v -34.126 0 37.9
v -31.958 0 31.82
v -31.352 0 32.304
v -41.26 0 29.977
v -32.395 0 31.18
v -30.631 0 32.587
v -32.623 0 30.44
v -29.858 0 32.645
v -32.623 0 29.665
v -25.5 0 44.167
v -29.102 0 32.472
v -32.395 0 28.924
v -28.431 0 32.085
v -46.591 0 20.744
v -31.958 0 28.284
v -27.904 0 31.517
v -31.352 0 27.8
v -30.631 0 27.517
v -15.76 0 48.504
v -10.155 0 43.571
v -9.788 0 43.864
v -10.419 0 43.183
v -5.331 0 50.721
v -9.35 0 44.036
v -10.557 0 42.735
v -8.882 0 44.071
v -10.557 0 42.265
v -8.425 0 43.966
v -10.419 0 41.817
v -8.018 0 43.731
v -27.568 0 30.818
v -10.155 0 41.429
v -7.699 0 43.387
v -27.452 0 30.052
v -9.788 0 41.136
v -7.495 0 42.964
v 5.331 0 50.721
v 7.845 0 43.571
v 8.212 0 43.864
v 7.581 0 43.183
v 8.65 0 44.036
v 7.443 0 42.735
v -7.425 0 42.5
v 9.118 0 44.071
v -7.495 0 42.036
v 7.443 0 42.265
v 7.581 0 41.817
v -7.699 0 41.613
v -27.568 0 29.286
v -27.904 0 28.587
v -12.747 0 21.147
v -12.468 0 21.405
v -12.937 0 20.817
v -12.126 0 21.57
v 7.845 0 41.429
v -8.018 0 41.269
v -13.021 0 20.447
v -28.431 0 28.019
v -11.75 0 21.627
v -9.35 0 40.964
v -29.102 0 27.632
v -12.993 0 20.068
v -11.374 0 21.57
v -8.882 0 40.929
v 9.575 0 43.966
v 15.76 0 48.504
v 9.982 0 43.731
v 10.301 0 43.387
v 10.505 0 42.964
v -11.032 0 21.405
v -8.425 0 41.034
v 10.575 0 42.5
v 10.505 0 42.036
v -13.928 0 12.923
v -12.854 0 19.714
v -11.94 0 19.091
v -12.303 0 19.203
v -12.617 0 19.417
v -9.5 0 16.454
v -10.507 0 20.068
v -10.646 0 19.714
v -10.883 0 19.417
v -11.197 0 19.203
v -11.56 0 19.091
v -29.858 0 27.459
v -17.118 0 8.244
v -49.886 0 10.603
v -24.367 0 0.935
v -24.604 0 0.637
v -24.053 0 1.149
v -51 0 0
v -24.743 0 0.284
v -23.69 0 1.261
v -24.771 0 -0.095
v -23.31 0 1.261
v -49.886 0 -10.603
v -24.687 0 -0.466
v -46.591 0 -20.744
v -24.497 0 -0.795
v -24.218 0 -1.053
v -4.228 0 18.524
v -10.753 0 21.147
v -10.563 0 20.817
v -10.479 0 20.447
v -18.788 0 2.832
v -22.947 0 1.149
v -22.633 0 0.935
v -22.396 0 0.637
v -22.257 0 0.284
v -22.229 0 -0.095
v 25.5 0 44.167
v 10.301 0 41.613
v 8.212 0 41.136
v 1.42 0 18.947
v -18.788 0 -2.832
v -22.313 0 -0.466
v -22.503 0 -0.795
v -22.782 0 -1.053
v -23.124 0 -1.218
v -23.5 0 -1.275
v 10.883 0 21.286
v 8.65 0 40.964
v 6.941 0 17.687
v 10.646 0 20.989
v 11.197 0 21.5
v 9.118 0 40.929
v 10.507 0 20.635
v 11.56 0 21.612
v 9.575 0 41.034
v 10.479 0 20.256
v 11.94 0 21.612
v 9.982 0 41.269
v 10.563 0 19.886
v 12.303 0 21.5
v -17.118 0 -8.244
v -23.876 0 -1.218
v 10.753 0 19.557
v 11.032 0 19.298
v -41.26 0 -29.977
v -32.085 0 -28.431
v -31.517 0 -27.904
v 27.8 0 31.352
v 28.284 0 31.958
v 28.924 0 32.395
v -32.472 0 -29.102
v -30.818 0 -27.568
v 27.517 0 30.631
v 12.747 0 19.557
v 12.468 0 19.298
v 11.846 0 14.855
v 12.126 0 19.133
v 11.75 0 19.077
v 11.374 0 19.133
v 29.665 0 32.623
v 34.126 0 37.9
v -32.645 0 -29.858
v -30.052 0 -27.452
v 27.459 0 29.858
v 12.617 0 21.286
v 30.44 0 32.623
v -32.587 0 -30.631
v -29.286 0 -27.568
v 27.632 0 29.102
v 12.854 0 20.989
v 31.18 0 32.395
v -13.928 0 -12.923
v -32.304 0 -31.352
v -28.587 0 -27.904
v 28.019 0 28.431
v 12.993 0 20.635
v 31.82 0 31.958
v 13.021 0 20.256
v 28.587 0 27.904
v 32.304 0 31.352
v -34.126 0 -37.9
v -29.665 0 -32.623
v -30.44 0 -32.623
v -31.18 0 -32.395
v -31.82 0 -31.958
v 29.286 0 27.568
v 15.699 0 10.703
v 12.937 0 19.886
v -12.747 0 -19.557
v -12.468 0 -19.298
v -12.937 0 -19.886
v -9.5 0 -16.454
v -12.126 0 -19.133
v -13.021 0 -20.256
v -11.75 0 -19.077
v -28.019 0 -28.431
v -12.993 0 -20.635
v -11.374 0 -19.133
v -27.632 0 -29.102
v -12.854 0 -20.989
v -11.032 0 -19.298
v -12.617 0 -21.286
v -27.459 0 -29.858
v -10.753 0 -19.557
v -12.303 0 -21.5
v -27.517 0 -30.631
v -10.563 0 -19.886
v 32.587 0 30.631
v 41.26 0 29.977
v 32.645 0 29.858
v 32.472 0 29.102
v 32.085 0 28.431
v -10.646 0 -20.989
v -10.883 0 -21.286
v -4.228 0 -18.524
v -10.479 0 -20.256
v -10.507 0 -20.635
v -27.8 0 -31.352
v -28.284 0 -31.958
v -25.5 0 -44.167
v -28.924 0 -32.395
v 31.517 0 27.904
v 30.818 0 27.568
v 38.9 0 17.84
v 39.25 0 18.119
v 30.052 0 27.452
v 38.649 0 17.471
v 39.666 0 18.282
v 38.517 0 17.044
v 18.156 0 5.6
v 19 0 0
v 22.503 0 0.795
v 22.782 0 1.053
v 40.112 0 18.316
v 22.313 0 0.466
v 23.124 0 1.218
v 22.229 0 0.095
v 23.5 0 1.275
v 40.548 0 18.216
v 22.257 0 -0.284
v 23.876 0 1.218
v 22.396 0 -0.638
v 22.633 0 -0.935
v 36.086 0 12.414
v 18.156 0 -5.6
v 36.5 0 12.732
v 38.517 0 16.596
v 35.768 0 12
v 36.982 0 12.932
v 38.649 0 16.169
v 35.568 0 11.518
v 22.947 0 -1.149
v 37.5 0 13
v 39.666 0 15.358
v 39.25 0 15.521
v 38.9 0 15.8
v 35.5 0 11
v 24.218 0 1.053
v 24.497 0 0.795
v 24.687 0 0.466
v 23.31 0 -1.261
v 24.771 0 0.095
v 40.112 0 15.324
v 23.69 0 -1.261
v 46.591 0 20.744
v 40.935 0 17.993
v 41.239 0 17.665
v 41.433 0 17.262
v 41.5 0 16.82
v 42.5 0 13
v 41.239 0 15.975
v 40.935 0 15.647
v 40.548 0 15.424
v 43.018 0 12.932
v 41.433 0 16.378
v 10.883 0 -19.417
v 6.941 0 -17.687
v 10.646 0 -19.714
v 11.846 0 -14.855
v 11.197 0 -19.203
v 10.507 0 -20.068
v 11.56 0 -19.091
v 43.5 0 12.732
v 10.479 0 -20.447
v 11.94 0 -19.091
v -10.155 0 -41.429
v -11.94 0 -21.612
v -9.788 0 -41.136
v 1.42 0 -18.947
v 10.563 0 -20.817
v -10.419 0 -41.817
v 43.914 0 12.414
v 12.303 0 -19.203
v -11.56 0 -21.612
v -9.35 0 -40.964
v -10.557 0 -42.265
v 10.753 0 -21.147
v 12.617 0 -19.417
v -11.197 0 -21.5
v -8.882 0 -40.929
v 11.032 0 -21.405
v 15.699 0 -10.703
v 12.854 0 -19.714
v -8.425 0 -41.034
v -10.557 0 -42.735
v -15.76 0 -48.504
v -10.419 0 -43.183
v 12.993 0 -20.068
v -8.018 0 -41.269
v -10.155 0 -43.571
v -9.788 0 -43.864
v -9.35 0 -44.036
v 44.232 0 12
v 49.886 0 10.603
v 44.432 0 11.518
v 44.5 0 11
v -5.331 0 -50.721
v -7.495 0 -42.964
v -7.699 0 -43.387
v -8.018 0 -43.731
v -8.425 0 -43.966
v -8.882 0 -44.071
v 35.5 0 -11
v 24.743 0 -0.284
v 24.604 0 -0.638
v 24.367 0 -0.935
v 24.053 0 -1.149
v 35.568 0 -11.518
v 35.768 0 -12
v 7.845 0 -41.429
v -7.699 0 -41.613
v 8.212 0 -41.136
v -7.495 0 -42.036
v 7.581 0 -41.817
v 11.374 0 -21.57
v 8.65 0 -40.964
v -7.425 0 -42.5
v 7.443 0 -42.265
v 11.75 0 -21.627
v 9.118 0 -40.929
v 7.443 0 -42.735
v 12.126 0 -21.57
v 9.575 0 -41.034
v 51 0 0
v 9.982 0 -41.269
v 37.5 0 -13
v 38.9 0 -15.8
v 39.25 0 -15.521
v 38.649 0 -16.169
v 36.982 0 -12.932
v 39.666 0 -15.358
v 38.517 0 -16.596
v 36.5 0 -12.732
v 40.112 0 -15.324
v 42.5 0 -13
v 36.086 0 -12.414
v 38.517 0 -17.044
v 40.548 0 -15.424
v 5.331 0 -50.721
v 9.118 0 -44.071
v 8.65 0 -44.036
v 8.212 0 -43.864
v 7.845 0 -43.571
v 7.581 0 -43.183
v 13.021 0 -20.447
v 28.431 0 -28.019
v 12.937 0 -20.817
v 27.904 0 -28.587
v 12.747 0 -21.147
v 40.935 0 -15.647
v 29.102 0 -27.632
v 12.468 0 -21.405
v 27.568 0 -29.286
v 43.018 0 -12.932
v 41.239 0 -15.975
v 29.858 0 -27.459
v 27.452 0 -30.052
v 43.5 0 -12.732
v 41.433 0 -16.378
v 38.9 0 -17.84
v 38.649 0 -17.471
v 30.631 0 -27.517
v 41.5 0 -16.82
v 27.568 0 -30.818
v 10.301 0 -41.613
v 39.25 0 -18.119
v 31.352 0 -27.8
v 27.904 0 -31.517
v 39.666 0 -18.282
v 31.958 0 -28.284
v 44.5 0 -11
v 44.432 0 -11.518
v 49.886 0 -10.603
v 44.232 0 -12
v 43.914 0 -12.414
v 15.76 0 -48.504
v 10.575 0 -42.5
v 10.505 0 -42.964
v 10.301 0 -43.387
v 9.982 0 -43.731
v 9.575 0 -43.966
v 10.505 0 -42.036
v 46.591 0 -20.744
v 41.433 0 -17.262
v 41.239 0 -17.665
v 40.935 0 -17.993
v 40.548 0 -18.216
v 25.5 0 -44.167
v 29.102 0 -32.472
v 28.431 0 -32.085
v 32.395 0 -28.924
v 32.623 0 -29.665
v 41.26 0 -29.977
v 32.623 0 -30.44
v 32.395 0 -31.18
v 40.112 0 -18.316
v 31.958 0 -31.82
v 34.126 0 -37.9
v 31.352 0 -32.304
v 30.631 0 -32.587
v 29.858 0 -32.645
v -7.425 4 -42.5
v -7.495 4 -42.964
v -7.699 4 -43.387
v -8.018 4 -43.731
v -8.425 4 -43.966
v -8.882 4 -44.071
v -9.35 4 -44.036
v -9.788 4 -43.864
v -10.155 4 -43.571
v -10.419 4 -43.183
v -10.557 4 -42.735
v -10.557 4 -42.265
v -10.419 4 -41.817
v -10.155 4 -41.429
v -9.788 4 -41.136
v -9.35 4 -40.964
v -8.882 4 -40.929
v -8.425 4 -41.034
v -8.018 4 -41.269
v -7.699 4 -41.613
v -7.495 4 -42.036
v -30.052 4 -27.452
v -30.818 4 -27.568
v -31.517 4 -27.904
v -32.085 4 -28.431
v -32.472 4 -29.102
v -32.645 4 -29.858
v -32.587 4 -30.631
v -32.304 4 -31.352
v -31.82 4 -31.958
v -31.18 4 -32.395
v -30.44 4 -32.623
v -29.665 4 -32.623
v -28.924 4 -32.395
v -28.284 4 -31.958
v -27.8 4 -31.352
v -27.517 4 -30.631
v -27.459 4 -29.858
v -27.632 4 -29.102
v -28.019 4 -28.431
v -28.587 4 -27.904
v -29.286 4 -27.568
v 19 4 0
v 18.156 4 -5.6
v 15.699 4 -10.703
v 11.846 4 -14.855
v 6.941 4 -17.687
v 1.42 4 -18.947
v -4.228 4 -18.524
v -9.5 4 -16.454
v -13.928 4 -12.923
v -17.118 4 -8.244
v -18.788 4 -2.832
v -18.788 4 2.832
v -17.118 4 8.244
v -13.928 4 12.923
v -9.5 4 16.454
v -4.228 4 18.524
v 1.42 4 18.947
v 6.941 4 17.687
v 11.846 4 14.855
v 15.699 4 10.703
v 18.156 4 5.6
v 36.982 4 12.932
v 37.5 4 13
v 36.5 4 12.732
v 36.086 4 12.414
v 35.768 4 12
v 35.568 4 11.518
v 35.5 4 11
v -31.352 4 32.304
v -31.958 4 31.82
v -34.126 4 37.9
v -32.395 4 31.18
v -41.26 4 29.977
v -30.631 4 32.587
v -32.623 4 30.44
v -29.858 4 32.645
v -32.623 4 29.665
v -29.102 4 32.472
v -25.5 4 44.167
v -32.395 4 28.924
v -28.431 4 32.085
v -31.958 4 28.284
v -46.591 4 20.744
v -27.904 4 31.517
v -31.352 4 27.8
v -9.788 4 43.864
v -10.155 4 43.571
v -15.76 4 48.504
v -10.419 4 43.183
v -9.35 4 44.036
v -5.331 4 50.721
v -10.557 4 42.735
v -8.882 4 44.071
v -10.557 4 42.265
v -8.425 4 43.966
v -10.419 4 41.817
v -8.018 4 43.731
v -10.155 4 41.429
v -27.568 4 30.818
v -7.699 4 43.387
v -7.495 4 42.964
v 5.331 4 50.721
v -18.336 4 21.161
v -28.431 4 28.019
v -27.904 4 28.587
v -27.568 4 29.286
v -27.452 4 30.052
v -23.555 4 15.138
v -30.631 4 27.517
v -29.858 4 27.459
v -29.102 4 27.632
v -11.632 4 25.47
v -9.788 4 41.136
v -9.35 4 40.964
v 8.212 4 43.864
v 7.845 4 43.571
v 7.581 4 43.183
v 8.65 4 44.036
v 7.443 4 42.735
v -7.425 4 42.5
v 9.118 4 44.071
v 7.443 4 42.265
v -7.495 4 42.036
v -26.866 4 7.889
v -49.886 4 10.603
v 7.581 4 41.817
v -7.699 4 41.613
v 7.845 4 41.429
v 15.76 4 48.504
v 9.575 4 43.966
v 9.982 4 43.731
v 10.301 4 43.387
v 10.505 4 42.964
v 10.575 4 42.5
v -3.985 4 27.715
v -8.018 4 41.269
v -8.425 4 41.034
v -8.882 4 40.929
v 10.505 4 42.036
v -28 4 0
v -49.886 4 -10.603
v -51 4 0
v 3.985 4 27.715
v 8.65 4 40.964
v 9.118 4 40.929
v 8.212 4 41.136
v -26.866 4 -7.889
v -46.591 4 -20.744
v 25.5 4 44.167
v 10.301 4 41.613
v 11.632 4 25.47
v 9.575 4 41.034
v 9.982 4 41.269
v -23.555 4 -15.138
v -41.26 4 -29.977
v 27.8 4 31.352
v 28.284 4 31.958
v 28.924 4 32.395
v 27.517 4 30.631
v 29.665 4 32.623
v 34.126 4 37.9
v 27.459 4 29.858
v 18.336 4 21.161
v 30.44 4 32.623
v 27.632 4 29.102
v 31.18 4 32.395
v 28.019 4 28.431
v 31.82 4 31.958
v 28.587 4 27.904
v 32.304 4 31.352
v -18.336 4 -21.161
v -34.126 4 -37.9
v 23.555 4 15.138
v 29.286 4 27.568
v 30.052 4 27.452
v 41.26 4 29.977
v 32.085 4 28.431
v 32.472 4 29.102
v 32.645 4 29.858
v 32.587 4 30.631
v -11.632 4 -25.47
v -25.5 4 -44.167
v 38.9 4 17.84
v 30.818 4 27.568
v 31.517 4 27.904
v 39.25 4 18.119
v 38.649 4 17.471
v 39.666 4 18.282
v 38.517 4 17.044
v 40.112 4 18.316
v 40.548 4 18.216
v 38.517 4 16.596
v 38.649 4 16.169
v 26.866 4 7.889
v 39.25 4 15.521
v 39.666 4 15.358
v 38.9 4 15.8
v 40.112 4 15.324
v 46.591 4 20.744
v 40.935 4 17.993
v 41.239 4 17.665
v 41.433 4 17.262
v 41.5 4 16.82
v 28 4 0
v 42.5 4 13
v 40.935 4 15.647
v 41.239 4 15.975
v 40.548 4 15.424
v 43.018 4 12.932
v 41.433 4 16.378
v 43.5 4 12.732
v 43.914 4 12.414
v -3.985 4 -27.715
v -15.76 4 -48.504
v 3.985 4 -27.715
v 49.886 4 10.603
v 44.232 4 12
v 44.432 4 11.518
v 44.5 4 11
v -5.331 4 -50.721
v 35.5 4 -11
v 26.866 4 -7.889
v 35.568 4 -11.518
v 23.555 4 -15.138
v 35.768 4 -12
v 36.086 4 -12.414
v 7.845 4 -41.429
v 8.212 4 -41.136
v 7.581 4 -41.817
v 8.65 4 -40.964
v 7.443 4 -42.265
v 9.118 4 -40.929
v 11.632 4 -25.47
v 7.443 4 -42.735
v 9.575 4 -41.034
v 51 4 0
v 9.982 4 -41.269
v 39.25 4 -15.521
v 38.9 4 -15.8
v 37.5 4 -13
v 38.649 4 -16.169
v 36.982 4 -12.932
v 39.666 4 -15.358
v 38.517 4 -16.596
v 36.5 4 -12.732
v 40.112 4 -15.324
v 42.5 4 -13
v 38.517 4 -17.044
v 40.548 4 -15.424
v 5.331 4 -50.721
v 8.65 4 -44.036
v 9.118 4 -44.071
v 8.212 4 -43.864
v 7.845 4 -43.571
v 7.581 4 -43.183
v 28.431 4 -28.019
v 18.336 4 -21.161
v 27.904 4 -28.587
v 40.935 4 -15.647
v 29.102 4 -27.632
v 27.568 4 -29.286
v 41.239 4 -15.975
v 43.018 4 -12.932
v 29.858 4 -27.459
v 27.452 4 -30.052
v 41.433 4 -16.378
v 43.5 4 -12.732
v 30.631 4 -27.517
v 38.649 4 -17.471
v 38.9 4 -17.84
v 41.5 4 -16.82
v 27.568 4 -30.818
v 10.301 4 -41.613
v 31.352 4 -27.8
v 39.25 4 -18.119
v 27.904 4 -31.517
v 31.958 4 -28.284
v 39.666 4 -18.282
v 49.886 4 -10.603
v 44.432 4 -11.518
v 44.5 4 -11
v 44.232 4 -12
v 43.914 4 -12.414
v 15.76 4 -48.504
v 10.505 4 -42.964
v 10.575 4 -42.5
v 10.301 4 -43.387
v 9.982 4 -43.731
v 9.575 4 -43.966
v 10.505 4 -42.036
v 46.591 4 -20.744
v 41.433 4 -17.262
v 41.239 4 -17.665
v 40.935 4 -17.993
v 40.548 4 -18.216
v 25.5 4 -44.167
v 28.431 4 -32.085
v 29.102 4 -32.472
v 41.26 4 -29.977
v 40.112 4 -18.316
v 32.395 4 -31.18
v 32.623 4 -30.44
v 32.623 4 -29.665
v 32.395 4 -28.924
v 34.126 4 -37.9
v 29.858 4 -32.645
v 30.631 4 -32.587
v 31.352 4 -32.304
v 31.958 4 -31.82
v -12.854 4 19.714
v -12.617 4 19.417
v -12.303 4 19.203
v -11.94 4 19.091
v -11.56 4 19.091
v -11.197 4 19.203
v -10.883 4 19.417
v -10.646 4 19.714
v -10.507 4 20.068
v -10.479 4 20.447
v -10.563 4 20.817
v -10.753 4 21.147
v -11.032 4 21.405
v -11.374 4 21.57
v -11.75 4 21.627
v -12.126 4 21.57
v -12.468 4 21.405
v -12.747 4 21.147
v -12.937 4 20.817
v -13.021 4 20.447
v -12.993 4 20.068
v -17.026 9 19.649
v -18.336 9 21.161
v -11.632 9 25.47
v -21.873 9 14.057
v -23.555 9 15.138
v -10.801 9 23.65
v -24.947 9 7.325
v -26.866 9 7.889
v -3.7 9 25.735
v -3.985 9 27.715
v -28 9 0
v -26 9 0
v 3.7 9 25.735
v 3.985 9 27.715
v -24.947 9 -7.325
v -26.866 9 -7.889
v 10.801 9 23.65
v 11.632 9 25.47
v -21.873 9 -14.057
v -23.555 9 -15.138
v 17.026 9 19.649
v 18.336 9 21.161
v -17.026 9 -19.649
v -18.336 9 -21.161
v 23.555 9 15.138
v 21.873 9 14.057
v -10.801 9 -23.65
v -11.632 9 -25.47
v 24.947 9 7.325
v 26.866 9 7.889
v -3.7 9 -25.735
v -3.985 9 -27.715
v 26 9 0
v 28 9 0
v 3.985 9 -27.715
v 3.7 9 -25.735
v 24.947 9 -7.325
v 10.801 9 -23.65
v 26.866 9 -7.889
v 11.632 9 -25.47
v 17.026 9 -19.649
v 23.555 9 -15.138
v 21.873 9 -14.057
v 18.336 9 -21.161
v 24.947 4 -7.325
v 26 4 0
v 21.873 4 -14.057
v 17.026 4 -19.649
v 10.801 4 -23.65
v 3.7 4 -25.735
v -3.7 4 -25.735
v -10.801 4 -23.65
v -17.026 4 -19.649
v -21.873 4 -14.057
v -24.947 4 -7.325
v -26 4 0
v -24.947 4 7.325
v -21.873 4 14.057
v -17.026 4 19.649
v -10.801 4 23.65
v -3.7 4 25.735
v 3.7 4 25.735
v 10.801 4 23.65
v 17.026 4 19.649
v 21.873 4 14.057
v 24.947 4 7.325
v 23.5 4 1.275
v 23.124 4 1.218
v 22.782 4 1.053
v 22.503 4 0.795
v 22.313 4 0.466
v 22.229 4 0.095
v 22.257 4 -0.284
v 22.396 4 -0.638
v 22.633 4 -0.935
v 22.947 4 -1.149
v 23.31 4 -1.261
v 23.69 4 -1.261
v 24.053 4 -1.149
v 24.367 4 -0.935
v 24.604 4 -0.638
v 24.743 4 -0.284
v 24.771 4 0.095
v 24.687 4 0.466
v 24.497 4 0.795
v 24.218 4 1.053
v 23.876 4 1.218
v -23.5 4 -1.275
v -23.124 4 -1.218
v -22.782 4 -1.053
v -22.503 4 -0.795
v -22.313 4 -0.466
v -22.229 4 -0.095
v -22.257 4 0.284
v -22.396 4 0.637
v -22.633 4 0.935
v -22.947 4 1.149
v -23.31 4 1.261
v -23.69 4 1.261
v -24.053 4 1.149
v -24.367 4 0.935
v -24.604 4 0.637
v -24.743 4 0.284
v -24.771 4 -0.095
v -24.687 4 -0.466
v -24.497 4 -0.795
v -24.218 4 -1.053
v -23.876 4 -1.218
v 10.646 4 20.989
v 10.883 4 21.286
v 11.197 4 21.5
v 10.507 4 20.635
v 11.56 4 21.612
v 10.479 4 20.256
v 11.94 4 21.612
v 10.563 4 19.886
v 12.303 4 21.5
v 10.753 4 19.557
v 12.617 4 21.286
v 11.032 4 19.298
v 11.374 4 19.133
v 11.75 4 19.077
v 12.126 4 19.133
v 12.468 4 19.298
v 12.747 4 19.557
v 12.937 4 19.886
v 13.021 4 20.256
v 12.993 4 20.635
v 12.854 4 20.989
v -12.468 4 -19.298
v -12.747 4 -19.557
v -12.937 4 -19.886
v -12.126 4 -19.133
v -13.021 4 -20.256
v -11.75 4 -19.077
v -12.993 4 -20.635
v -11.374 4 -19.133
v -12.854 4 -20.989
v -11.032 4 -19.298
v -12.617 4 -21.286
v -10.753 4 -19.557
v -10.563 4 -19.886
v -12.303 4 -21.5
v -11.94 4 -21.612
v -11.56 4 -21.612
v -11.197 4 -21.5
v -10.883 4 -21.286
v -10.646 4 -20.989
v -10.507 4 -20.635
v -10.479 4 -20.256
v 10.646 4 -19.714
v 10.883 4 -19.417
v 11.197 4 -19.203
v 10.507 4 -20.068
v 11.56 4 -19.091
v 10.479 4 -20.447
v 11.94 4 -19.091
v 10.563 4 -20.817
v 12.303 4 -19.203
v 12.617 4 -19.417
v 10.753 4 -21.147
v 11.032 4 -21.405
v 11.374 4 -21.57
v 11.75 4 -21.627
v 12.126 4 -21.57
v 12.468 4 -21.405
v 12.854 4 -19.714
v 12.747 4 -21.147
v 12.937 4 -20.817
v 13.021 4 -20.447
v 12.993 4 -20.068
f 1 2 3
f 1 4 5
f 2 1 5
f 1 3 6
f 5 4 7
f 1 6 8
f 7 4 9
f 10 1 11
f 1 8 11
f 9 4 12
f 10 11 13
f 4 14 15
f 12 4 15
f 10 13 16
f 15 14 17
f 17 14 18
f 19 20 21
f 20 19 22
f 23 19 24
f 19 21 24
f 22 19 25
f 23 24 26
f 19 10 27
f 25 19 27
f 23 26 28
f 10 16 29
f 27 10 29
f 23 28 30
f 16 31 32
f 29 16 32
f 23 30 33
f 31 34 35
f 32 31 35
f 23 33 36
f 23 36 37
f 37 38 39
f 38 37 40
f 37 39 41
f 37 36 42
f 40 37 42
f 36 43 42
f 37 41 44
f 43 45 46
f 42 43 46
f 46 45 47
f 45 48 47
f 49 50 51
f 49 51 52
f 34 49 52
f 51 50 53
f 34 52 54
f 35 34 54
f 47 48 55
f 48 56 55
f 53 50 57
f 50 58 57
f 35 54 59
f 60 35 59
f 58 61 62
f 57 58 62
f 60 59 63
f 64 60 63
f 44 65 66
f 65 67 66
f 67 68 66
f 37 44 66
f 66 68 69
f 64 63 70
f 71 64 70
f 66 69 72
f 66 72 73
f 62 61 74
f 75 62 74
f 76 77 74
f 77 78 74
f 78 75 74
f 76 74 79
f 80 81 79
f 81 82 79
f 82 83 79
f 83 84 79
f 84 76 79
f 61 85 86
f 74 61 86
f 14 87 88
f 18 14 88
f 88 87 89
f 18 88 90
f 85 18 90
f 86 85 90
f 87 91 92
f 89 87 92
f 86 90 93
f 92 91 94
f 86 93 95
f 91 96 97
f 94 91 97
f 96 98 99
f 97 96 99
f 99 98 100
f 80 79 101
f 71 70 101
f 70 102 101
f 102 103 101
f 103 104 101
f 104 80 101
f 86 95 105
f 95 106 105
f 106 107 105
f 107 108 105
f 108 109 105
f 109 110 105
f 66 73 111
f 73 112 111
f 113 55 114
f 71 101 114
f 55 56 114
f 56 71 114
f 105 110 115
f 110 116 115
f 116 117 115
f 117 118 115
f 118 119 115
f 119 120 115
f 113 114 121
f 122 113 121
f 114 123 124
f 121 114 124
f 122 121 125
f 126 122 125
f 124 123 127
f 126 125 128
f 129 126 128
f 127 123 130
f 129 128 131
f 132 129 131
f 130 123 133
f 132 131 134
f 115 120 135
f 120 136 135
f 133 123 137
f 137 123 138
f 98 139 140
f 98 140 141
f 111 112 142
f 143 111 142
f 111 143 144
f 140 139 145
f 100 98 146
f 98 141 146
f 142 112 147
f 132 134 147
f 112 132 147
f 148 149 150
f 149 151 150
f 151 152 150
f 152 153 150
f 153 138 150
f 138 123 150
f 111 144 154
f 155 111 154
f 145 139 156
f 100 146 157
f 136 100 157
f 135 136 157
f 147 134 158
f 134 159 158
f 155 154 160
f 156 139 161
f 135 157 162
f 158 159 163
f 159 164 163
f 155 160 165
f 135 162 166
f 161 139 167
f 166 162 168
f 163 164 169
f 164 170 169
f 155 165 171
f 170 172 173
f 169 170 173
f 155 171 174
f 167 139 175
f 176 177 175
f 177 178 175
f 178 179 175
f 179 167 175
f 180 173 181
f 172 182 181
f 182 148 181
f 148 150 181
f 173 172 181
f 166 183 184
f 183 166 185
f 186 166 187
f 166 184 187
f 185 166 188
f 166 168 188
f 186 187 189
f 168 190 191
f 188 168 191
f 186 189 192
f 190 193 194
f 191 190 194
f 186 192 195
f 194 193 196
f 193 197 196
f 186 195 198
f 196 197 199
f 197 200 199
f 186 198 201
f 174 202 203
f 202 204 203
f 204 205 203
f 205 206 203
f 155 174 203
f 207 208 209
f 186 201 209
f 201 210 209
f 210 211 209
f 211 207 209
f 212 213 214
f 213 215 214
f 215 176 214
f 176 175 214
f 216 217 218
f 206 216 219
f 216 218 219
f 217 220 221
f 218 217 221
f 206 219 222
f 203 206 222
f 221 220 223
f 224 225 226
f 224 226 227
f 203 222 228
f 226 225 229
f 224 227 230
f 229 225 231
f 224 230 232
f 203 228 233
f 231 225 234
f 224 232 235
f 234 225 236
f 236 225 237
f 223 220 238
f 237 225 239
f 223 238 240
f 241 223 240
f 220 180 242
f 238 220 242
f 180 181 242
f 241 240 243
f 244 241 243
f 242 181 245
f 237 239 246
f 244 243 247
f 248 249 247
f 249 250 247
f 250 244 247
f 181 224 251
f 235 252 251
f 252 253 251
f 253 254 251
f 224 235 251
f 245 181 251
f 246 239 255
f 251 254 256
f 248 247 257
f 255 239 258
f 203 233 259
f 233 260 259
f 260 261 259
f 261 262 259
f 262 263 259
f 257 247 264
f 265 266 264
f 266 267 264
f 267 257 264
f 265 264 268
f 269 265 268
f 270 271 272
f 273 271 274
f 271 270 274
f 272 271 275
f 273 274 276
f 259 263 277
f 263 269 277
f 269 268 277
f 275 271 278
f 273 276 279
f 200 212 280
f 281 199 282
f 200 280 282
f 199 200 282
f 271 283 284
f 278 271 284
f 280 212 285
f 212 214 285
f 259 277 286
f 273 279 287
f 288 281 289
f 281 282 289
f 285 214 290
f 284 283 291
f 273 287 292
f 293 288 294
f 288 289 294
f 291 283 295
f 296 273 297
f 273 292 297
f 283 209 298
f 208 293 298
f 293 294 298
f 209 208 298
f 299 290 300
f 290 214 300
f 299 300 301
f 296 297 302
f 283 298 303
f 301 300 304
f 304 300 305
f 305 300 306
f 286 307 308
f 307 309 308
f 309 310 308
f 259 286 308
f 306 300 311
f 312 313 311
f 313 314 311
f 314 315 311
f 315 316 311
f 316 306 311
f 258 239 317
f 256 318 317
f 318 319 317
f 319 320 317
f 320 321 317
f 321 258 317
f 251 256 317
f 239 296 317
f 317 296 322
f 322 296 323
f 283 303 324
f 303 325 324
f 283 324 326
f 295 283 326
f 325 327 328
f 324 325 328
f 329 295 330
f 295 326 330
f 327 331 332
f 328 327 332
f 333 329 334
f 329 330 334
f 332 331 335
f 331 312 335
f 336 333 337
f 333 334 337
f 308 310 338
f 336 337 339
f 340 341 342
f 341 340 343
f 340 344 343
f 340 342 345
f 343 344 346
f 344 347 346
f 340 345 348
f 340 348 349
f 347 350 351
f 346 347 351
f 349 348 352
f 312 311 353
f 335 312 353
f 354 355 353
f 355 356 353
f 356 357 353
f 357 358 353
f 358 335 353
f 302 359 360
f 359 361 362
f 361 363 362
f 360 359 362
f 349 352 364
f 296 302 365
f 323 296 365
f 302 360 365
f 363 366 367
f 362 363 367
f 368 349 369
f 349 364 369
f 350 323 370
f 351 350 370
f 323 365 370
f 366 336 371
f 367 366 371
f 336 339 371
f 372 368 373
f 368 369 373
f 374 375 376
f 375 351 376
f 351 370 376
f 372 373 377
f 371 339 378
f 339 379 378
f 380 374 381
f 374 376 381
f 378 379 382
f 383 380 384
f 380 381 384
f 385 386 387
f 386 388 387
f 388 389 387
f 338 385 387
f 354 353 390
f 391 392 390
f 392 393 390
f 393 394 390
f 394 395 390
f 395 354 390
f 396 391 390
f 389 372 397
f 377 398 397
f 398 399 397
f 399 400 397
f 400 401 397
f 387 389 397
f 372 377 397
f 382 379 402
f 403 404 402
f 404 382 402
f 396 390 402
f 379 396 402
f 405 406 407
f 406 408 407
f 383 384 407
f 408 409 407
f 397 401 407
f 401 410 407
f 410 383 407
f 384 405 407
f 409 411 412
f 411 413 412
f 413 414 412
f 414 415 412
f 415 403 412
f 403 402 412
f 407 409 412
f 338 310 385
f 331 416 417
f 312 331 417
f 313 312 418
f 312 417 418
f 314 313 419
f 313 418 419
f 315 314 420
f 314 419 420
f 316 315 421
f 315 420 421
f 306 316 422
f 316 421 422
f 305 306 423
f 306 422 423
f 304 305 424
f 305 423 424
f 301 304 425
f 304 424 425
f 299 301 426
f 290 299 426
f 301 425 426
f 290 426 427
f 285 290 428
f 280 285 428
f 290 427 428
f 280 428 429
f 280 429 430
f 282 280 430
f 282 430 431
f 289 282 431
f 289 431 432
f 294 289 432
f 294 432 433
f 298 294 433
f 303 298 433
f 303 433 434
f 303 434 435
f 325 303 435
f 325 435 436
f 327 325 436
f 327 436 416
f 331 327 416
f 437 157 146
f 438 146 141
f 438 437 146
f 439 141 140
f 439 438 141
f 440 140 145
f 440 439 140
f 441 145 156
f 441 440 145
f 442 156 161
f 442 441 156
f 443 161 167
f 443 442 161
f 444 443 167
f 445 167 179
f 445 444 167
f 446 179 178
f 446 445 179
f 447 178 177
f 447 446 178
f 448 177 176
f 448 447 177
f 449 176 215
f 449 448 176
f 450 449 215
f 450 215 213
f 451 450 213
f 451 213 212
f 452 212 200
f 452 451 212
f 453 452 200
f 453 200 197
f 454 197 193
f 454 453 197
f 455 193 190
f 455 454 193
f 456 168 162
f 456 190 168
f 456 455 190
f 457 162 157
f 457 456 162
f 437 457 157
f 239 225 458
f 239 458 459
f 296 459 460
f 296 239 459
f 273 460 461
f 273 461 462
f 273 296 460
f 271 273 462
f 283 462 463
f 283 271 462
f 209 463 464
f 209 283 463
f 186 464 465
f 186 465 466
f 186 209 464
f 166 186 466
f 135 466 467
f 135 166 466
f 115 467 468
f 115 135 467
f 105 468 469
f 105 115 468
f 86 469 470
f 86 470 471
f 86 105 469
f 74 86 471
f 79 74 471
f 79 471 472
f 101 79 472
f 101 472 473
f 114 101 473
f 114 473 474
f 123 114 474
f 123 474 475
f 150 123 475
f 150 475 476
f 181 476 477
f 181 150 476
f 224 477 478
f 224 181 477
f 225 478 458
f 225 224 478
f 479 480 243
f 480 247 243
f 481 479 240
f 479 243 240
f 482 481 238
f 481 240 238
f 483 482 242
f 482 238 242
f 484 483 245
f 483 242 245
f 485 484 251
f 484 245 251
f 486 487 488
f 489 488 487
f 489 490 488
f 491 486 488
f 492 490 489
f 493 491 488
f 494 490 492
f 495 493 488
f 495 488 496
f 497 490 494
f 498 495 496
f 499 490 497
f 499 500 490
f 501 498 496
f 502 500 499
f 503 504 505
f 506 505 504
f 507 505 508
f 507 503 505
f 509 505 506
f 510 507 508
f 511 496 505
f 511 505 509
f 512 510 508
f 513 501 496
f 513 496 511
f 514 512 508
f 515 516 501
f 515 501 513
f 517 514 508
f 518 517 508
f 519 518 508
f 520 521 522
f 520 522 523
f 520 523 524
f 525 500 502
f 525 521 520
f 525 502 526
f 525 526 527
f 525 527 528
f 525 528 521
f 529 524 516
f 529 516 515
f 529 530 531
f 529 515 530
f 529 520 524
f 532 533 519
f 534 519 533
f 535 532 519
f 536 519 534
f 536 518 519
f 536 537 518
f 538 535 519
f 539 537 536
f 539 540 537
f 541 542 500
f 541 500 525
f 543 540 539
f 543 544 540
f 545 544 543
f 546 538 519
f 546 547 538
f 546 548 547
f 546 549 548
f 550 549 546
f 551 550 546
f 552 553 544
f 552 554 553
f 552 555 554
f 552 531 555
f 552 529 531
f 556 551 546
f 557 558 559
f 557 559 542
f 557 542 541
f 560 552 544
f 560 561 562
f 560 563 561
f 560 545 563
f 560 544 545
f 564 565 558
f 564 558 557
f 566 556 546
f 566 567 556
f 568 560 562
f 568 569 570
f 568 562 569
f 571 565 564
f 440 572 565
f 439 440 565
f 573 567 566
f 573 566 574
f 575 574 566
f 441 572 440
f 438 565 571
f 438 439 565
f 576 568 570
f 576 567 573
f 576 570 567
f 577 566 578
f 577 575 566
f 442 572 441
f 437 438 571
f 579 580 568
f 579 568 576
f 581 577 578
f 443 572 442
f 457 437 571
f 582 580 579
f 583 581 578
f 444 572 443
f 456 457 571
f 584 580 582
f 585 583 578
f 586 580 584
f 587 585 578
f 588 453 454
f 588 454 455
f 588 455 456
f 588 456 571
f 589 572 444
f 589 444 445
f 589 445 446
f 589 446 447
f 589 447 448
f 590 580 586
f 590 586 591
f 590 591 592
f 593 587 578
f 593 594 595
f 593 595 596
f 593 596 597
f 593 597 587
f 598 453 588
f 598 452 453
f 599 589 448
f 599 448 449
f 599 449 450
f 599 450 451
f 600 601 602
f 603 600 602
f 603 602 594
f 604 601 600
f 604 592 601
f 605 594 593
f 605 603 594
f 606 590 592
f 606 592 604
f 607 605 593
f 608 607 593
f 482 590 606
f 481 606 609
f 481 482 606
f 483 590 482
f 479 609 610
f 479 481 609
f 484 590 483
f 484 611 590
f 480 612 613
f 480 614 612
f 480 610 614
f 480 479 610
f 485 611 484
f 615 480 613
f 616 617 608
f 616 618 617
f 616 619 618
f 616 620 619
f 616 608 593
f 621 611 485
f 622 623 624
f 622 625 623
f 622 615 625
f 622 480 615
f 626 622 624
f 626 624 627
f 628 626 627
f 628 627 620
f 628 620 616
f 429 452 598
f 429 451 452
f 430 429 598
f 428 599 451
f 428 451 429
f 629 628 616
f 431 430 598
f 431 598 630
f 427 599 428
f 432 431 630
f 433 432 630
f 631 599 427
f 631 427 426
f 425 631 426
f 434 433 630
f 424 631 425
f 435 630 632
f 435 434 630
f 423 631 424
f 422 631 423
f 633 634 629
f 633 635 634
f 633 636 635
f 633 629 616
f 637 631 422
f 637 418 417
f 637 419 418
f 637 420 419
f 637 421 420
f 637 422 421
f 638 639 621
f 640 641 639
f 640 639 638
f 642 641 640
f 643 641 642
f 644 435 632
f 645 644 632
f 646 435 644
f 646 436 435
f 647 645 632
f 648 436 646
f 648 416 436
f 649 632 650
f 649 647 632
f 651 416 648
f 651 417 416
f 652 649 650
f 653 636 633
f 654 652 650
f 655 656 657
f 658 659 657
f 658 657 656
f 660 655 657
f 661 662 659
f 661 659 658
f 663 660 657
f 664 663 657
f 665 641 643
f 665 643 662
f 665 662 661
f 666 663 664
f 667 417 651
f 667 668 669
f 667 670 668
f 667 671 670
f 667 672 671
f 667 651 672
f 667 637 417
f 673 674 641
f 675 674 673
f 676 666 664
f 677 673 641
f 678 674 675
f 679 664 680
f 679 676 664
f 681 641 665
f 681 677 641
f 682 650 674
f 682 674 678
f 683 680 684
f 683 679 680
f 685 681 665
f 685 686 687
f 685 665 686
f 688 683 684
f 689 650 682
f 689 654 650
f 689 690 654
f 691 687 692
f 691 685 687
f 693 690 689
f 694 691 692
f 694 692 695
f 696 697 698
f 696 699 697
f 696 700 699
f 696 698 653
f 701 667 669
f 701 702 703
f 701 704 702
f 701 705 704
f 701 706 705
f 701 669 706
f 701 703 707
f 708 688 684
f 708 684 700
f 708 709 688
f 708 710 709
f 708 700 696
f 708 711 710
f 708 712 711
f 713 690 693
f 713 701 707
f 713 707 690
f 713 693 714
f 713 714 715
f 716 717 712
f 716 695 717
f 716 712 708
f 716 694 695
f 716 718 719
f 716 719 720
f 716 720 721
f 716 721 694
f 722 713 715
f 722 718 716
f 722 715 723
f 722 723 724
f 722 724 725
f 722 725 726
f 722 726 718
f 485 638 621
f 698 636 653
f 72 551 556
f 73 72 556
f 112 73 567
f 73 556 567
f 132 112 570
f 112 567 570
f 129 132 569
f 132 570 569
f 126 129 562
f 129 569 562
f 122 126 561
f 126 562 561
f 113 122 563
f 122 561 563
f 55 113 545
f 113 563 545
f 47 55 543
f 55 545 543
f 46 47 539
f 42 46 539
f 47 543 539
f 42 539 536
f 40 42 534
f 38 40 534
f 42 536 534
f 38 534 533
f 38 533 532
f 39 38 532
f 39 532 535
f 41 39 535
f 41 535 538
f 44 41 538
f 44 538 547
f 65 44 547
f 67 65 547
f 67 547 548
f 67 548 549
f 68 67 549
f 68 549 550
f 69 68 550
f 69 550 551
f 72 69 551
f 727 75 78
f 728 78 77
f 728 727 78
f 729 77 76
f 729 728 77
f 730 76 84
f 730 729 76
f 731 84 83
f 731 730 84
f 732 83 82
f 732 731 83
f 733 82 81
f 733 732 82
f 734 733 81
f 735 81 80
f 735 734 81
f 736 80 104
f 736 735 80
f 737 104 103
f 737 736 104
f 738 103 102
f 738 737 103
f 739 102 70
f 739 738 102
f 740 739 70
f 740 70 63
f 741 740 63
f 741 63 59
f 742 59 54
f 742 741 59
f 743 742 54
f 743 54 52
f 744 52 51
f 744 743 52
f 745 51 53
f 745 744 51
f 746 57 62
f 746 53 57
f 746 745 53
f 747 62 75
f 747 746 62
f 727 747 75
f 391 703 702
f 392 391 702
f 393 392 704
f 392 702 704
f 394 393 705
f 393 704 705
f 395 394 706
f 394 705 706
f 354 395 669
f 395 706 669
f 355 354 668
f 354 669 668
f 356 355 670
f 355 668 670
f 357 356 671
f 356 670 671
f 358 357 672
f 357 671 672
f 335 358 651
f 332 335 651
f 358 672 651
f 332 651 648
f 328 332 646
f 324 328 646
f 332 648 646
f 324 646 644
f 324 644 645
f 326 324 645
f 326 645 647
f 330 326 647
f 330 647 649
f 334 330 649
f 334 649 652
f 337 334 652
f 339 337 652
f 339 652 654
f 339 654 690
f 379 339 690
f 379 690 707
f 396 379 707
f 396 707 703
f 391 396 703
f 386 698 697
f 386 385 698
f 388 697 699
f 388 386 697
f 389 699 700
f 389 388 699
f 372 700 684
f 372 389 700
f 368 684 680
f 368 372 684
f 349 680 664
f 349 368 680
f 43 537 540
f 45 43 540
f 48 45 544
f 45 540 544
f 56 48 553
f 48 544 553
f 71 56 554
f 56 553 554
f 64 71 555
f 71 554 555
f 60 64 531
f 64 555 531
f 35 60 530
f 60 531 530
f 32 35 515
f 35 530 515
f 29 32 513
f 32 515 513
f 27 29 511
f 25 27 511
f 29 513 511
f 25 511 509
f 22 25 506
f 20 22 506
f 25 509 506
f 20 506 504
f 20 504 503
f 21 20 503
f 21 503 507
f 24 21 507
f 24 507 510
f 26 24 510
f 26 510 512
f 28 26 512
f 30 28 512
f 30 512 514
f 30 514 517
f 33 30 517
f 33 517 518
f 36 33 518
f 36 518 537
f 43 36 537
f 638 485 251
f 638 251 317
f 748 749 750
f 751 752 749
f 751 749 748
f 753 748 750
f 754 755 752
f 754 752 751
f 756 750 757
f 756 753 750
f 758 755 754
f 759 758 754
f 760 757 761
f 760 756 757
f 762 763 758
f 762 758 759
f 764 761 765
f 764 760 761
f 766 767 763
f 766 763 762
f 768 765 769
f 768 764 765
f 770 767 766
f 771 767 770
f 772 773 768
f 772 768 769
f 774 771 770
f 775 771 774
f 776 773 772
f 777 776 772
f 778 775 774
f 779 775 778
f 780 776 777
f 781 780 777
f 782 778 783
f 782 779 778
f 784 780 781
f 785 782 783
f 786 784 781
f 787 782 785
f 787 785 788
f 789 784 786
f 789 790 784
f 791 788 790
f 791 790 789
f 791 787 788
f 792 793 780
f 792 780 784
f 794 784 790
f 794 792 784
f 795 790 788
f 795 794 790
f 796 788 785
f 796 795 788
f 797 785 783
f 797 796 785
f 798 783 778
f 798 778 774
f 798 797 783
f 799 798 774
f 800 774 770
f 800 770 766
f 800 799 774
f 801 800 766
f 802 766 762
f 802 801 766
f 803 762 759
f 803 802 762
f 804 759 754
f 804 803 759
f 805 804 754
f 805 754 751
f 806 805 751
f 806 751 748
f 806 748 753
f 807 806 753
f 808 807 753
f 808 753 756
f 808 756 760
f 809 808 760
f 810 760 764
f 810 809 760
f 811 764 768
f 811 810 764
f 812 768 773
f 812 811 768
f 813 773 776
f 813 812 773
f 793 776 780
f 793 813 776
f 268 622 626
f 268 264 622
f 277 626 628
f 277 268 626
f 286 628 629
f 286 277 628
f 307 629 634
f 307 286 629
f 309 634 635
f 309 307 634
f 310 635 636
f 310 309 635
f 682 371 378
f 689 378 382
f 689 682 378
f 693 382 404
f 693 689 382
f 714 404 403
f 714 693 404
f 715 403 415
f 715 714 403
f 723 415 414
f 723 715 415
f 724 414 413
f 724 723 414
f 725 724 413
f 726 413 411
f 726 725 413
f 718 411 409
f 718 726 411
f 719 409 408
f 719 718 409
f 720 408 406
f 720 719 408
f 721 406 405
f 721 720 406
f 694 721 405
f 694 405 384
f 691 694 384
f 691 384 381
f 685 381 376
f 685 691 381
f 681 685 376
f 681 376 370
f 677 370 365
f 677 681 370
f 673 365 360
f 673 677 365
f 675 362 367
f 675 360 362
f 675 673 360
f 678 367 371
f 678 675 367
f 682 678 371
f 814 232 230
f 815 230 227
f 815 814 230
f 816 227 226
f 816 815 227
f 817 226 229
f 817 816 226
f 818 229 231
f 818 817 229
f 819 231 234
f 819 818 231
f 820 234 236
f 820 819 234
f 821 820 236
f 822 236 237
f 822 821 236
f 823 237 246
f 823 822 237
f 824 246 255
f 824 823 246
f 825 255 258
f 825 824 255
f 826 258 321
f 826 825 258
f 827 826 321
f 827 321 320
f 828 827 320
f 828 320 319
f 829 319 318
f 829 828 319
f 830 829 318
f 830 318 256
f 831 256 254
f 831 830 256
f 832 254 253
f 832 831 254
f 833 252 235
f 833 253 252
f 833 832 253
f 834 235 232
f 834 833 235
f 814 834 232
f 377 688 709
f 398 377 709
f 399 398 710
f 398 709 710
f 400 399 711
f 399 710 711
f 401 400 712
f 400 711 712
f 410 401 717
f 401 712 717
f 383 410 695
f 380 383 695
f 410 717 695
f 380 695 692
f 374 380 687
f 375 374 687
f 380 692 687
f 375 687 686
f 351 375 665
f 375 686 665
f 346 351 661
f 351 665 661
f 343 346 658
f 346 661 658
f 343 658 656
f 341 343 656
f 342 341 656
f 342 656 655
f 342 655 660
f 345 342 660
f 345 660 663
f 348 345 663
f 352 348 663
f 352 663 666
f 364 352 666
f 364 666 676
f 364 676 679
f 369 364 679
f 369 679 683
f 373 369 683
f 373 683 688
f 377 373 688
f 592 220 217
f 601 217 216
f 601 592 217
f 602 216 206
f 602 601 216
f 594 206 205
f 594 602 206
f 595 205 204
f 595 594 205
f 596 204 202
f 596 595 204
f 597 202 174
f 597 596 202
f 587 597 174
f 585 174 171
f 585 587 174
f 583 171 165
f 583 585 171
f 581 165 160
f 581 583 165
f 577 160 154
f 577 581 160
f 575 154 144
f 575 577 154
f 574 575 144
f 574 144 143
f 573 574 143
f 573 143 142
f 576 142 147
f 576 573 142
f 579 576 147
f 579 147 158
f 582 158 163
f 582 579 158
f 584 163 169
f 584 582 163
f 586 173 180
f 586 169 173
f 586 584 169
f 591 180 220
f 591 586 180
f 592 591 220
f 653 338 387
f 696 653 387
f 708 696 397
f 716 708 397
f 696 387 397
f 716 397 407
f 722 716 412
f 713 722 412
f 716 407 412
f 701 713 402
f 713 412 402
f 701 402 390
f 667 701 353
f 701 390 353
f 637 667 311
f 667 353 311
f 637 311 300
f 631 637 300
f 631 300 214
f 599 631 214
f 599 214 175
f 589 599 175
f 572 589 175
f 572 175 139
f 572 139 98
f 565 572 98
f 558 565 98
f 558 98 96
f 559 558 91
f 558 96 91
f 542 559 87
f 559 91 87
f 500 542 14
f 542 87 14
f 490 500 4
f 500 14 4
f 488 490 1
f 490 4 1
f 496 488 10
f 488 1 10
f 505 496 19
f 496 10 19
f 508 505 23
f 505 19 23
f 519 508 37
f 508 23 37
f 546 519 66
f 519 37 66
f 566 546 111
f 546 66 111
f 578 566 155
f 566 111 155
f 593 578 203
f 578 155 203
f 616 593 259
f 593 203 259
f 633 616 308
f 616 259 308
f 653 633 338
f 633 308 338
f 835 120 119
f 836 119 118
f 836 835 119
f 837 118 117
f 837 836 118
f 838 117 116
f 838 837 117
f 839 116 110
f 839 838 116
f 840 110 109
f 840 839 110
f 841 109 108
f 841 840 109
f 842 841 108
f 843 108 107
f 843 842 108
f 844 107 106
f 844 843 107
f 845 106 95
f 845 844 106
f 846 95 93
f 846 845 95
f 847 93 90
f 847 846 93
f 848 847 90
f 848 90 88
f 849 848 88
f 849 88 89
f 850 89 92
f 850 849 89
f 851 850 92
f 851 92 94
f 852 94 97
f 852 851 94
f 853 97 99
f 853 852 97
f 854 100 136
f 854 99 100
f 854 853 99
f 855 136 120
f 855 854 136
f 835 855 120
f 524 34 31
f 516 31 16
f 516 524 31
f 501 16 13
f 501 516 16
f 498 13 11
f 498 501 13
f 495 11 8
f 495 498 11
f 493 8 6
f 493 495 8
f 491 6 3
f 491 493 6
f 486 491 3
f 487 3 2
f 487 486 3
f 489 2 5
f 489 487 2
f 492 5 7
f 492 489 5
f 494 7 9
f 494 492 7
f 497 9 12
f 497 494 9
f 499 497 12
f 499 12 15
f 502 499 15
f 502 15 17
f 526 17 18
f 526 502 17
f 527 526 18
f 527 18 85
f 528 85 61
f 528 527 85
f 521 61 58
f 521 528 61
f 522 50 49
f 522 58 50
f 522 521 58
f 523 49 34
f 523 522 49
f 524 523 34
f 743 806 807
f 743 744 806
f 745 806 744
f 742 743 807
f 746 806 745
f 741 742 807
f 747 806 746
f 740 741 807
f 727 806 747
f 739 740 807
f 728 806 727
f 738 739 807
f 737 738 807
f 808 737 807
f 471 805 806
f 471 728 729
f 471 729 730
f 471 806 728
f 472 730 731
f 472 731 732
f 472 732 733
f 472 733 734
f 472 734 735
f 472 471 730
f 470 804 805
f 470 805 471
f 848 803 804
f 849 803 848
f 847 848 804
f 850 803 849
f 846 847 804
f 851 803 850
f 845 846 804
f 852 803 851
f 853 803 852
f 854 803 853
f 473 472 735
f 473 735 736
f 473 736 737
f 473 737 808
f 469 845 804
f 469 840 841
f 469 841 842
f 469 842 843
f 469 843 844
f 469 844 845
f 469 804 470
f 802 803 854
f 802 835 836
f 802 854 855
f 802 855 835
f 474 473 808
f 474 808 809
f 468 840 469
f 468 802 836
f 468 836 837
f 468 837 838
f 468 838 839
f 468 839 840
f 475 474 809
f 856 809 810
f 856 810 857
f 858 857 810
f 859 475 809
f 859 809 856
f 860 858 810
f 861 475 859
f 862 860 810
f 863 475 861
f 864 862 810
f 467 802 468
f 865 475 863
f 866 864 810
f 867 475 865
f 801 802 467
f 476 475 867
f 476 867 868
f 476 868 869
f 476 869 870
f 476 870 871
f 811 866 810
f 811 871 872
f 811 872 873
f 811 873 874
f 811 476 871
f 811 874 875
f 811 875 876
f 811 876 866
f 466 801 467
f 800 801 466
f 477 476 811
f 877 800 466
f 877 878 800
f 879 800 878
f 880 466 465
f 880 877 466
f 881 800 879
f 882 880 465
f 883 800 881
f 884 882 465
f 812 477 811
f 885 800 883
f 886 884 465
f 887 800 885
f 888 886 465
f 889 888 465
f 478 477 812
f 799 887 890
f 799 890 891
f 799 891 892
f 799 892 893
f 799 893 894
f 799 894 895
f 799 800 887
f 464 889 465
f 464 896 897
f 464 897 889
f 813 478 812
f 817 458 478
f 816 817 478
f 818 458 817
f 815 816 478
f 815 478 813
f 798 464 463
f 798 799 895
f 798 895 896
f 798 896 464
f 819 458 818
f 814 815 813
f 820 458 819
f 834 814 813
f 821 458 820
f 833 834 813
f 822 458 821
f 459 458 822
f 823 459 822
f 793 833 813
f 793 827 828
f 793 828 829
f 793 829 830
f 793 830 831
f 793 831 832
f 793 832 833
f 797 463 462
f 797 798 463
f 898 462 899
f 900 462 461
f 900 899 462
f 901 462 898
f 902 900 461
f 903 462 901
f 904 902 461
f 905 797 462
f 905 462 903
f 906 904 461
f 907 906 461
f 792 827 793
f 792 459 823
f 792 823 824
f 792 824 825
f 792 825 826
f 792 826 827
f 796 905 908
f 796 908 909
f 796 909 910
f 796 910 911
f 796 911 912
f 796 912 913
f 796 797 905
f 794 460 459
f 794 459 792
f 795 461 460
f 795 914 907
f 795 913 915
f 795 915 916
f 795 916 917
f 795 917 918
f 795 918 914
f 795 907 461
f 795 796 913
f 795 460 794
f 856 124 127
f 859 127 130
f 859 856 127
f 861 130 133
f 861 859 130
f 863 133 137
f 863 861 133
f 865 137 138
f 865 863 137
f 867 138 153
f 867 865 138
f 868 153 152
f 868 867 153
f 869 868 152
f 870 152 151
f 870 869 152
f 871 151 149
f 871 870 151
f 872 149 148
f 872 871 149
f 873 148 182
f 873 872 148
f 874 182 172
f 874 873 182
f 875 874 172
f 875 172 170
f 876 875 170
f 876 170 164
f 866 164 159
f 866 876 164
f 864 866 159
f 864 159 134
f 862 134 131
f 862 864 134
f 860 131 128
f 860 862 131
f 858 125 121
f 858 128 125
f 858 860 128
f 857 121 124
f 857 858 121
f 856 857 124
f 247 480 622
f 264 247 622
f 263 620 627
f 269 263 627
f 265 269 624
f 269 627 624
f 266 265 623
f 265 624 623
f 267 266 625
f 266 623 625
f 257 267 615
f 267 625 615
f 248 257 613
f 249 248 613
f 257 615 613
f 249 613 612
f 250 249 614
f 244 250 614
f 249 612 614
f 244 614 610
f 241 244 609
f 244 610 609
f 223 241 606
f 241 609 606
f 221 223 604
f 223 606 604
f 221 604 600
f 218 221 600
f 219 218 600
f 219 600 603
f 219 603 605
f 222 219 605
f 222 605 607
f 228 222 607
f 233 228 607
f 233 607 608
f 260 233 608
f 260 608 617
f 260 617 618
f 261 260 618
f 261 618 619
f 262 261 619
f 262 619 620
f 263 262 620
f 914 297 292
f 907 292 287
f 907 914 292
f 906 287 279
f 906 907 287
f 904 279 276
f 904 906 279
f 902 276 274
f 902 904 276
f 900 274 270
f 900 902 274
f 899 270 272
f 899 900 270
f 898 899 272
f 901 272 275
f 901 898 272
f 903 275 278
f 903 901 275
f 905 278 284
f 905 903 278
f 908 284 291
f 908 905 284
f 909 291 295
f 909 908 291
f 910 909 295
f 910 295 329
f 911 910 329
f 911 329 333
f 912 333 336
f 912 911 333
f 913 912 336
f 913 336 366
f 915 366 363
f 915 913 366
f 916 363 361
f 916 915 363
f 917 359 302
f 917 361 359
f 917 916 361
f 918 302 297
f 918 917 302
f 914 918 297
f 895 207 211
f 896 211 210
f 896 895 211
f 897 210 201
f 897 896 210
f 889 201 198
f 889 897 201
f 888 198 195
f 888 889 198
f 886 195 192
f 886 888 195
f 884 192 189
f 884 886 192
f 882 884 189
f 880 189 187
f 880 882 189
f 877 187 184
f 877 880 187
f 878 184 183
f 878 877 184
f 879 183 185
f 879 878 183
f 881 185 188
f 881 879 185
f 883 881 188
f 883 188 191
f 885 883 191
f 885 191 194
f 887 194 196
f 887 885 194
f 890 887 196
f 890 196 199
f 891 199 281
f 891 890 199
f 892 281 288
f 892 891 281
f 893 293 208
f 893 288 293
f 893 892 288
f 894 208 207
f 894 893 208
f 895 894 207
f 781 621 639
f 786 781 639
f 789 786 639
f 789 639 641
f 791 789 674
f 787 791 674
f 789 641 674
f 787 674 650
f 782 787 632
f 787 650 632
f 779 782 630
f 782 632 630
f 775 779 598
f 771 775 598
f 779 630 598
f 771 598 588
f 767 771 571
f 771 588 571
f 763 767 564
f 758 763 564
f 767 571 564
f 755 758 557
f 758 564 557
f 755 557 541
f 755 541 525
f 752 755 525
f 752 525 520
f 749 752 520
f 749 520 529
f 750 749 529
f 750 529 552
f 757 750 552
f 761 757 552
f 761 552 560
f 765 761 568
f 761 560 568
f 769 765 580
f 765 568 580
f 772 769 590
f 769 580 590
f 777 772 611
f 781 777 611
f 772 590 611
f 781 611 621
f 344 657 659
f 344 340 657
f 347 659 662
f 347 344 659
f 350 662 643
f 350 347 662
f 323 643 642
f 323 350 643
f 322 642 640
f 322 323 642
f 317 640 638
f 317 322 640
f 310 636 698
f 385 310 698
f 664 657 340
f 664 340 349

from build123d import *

# Parameters (mm, degrees)
SKETCH_1_R                  = 51
SKETCH_1_R_2                = 19
EXTRUDE_1_DEPTH             = 4
PATTERN_CIRCULAR_1_COUNT    = 6
HOLE_WIZARD_M32_D           = 3.15
PATTERN_LINEAR_1_COUNT      = 2
PATTERN_LINEAR_1_PITCH      = 18
PATTERN_LINEAR_1_COUNT_DIR2 = 2
PATTERN_LINEAR_1_PITCH_DIR2 = 85
SKETCH_14_R                 = 28
SKETCH_14_R_2               = 26
EXTRUDE_2_DEPTH             = 5
SKETCH_16_R                 = 1.5
SKETCH_16_W                 = 9
SKETCH_16_H                 = 26
CUT_EXTRUDE_1_DEPTH         = 5
FILLET_1_R                  = 2
PATTERN_CIRCULAR_2_COUNT    = 4


with BuildPart() as part:
    # Эскиз1 → Бобышка-Вытянуть1 (new body)
    with BuildSketch(Plane(origin=(0, 0, 0), x_dir=(1, 0, 0), z_dir=(0, 1, 0))):
        Circle(SKETCH_1_R)
        Circle(SKETCH_1_R_2, mode=Mode.SUBTRACT)
    extrude(amount=EXTRUDE_1_DEPTH)

    # Эскиз3 → Сверло под метчик  спиральное M2.51 (revolve, cut)
    with BuildSketch(Plane(origin=(23.5, 4, 0), x_dir=(0, 0, 1), z_dir=(1, 0, 0))):
        Polygon((0, 0), (0, 8.766097289), (1.275, 8), (1.275, 0), align=None)
    hole_wizard_m2_51 = revolve(axis=Axis((23.5, 10.35, 0), (0, -1, 0)), mode=Mode.SUBTRACT)

    # Круговой массив1: Сверло под метчик  спиральное M2.51 ×6 about axis
    pattern_circular_1_axis = Axis((0, 0, 0), (0, 1, 0))
    for i in range(1, PATTERN_CIRCULAR_1_COUNT):
        add(hole_wizard_m2_51.rotate(pattern_circular_1_axis, i * 360 / PATTERN_CIRCULAR_1_COUNT), mode=Mode.SUBTRACT)

    # Сверло под метчик  спиральное M32 (through all)
    with Locations(Plane(origin=(0, 0, 0), x_dir=(-1, 0, 0), z_dir=(0, -1, 0))):
        with Locations((-9, -42.5)):
            hole_wizard_m32 = Hole(HOLE_WIZARD_M32_D / 2)

    # Линейный массив1: Hole Wizard M32 2 × 2
    with Locations(*[(-i * PATTERN_LINEAR_1_PITCH, 0, -j * PATTERN_LINEAR_1_PITCH_DIR2) for i in range(PATTERN_LINEAR_1_COUNT) for j in range(PATTERN_LINEAR_1_COUNT_DIR2) if (i, j) != (0, 0)]):
        add(hole_wizard_m32, mode=Mode.SUBTRACT)

    # Эскиз14 → Бобышка-Вытянуть2 (add)
    with BuildSketch(Plane(origin=(0, 4, 0), x_dir=(1, 0, 0), z_dir=(0, 1, 0))):
        Circle(SKETCH_14_R)
        Circle(SKETCH_14_R_2, mode=Mode.SUBTRACT)
    extrude(amount=EXTRUDE_2_DEPTH)

    # Эскиз16 → Вырез-Вытянуть1 (cut, through all)
    with BuildSketch(Plane(origin=(0, 4, 0), x_dir=(1, 0, 0), z_dir=(0, 1, 0))):
        with Locations((40, 16.82)):
            Circle(SKETCH_16_R)
        with Locations((40, -16.82)):
            Circle(SKETCH_16_R)
        with Locations((40, 0)):
            Rectangle(SKETCH_16_W, SKETCH_16_H)
    extrude(amount=-CUT_EXTRUDE_1_DEPTH, mode=Mode.SUBTRACT)

    # Скругление1
    fillet_1_edges = [part.edges().sort_by_distance(p)[0] for p in [
        (35.5, 2, 13),
        (35.5, 2, -13),
        (44.5, 2, -13),
        (44.5, 2, 13),
    ]]
    fillet(fillet_1_edges, radius=FILLET_1_R)

    # Эскиз18 → Сверло под метчик  спиральное M51 (revolve, cut)
    with BuildSketch(Plane(origin=(-30.0520382, 4, -30.0520382), x_dir=(0, 0, 1), z_dir=(1, 0, 0))):
        Polygon((0, 0), (0, 9.562237609), (2.6, 8), (2.6, 0), align=None)
    hole_wizard_m51 = revolve(axis=Axis((-30.0520382, 10.35, -30.0520382), (0, -1, 0)), mode=Mode.SUBTRACT)

    # Круговой массив2: Сверло под метчик  спиральное M51 ×4 about axis
    pattern_circular_2_axis = Axis((0, 0, 0), (0, 1, 0))
    for i in range(1, PATTERN_CIRCULAR_2_COUNT):
        add(hole_wizard_m51.rotate(pattern_circular_2_axis, i * 360 / PATTERN_CIRCULAR_2_COUNT), mode=Mode.SUBTRACT)


solid = part.part
